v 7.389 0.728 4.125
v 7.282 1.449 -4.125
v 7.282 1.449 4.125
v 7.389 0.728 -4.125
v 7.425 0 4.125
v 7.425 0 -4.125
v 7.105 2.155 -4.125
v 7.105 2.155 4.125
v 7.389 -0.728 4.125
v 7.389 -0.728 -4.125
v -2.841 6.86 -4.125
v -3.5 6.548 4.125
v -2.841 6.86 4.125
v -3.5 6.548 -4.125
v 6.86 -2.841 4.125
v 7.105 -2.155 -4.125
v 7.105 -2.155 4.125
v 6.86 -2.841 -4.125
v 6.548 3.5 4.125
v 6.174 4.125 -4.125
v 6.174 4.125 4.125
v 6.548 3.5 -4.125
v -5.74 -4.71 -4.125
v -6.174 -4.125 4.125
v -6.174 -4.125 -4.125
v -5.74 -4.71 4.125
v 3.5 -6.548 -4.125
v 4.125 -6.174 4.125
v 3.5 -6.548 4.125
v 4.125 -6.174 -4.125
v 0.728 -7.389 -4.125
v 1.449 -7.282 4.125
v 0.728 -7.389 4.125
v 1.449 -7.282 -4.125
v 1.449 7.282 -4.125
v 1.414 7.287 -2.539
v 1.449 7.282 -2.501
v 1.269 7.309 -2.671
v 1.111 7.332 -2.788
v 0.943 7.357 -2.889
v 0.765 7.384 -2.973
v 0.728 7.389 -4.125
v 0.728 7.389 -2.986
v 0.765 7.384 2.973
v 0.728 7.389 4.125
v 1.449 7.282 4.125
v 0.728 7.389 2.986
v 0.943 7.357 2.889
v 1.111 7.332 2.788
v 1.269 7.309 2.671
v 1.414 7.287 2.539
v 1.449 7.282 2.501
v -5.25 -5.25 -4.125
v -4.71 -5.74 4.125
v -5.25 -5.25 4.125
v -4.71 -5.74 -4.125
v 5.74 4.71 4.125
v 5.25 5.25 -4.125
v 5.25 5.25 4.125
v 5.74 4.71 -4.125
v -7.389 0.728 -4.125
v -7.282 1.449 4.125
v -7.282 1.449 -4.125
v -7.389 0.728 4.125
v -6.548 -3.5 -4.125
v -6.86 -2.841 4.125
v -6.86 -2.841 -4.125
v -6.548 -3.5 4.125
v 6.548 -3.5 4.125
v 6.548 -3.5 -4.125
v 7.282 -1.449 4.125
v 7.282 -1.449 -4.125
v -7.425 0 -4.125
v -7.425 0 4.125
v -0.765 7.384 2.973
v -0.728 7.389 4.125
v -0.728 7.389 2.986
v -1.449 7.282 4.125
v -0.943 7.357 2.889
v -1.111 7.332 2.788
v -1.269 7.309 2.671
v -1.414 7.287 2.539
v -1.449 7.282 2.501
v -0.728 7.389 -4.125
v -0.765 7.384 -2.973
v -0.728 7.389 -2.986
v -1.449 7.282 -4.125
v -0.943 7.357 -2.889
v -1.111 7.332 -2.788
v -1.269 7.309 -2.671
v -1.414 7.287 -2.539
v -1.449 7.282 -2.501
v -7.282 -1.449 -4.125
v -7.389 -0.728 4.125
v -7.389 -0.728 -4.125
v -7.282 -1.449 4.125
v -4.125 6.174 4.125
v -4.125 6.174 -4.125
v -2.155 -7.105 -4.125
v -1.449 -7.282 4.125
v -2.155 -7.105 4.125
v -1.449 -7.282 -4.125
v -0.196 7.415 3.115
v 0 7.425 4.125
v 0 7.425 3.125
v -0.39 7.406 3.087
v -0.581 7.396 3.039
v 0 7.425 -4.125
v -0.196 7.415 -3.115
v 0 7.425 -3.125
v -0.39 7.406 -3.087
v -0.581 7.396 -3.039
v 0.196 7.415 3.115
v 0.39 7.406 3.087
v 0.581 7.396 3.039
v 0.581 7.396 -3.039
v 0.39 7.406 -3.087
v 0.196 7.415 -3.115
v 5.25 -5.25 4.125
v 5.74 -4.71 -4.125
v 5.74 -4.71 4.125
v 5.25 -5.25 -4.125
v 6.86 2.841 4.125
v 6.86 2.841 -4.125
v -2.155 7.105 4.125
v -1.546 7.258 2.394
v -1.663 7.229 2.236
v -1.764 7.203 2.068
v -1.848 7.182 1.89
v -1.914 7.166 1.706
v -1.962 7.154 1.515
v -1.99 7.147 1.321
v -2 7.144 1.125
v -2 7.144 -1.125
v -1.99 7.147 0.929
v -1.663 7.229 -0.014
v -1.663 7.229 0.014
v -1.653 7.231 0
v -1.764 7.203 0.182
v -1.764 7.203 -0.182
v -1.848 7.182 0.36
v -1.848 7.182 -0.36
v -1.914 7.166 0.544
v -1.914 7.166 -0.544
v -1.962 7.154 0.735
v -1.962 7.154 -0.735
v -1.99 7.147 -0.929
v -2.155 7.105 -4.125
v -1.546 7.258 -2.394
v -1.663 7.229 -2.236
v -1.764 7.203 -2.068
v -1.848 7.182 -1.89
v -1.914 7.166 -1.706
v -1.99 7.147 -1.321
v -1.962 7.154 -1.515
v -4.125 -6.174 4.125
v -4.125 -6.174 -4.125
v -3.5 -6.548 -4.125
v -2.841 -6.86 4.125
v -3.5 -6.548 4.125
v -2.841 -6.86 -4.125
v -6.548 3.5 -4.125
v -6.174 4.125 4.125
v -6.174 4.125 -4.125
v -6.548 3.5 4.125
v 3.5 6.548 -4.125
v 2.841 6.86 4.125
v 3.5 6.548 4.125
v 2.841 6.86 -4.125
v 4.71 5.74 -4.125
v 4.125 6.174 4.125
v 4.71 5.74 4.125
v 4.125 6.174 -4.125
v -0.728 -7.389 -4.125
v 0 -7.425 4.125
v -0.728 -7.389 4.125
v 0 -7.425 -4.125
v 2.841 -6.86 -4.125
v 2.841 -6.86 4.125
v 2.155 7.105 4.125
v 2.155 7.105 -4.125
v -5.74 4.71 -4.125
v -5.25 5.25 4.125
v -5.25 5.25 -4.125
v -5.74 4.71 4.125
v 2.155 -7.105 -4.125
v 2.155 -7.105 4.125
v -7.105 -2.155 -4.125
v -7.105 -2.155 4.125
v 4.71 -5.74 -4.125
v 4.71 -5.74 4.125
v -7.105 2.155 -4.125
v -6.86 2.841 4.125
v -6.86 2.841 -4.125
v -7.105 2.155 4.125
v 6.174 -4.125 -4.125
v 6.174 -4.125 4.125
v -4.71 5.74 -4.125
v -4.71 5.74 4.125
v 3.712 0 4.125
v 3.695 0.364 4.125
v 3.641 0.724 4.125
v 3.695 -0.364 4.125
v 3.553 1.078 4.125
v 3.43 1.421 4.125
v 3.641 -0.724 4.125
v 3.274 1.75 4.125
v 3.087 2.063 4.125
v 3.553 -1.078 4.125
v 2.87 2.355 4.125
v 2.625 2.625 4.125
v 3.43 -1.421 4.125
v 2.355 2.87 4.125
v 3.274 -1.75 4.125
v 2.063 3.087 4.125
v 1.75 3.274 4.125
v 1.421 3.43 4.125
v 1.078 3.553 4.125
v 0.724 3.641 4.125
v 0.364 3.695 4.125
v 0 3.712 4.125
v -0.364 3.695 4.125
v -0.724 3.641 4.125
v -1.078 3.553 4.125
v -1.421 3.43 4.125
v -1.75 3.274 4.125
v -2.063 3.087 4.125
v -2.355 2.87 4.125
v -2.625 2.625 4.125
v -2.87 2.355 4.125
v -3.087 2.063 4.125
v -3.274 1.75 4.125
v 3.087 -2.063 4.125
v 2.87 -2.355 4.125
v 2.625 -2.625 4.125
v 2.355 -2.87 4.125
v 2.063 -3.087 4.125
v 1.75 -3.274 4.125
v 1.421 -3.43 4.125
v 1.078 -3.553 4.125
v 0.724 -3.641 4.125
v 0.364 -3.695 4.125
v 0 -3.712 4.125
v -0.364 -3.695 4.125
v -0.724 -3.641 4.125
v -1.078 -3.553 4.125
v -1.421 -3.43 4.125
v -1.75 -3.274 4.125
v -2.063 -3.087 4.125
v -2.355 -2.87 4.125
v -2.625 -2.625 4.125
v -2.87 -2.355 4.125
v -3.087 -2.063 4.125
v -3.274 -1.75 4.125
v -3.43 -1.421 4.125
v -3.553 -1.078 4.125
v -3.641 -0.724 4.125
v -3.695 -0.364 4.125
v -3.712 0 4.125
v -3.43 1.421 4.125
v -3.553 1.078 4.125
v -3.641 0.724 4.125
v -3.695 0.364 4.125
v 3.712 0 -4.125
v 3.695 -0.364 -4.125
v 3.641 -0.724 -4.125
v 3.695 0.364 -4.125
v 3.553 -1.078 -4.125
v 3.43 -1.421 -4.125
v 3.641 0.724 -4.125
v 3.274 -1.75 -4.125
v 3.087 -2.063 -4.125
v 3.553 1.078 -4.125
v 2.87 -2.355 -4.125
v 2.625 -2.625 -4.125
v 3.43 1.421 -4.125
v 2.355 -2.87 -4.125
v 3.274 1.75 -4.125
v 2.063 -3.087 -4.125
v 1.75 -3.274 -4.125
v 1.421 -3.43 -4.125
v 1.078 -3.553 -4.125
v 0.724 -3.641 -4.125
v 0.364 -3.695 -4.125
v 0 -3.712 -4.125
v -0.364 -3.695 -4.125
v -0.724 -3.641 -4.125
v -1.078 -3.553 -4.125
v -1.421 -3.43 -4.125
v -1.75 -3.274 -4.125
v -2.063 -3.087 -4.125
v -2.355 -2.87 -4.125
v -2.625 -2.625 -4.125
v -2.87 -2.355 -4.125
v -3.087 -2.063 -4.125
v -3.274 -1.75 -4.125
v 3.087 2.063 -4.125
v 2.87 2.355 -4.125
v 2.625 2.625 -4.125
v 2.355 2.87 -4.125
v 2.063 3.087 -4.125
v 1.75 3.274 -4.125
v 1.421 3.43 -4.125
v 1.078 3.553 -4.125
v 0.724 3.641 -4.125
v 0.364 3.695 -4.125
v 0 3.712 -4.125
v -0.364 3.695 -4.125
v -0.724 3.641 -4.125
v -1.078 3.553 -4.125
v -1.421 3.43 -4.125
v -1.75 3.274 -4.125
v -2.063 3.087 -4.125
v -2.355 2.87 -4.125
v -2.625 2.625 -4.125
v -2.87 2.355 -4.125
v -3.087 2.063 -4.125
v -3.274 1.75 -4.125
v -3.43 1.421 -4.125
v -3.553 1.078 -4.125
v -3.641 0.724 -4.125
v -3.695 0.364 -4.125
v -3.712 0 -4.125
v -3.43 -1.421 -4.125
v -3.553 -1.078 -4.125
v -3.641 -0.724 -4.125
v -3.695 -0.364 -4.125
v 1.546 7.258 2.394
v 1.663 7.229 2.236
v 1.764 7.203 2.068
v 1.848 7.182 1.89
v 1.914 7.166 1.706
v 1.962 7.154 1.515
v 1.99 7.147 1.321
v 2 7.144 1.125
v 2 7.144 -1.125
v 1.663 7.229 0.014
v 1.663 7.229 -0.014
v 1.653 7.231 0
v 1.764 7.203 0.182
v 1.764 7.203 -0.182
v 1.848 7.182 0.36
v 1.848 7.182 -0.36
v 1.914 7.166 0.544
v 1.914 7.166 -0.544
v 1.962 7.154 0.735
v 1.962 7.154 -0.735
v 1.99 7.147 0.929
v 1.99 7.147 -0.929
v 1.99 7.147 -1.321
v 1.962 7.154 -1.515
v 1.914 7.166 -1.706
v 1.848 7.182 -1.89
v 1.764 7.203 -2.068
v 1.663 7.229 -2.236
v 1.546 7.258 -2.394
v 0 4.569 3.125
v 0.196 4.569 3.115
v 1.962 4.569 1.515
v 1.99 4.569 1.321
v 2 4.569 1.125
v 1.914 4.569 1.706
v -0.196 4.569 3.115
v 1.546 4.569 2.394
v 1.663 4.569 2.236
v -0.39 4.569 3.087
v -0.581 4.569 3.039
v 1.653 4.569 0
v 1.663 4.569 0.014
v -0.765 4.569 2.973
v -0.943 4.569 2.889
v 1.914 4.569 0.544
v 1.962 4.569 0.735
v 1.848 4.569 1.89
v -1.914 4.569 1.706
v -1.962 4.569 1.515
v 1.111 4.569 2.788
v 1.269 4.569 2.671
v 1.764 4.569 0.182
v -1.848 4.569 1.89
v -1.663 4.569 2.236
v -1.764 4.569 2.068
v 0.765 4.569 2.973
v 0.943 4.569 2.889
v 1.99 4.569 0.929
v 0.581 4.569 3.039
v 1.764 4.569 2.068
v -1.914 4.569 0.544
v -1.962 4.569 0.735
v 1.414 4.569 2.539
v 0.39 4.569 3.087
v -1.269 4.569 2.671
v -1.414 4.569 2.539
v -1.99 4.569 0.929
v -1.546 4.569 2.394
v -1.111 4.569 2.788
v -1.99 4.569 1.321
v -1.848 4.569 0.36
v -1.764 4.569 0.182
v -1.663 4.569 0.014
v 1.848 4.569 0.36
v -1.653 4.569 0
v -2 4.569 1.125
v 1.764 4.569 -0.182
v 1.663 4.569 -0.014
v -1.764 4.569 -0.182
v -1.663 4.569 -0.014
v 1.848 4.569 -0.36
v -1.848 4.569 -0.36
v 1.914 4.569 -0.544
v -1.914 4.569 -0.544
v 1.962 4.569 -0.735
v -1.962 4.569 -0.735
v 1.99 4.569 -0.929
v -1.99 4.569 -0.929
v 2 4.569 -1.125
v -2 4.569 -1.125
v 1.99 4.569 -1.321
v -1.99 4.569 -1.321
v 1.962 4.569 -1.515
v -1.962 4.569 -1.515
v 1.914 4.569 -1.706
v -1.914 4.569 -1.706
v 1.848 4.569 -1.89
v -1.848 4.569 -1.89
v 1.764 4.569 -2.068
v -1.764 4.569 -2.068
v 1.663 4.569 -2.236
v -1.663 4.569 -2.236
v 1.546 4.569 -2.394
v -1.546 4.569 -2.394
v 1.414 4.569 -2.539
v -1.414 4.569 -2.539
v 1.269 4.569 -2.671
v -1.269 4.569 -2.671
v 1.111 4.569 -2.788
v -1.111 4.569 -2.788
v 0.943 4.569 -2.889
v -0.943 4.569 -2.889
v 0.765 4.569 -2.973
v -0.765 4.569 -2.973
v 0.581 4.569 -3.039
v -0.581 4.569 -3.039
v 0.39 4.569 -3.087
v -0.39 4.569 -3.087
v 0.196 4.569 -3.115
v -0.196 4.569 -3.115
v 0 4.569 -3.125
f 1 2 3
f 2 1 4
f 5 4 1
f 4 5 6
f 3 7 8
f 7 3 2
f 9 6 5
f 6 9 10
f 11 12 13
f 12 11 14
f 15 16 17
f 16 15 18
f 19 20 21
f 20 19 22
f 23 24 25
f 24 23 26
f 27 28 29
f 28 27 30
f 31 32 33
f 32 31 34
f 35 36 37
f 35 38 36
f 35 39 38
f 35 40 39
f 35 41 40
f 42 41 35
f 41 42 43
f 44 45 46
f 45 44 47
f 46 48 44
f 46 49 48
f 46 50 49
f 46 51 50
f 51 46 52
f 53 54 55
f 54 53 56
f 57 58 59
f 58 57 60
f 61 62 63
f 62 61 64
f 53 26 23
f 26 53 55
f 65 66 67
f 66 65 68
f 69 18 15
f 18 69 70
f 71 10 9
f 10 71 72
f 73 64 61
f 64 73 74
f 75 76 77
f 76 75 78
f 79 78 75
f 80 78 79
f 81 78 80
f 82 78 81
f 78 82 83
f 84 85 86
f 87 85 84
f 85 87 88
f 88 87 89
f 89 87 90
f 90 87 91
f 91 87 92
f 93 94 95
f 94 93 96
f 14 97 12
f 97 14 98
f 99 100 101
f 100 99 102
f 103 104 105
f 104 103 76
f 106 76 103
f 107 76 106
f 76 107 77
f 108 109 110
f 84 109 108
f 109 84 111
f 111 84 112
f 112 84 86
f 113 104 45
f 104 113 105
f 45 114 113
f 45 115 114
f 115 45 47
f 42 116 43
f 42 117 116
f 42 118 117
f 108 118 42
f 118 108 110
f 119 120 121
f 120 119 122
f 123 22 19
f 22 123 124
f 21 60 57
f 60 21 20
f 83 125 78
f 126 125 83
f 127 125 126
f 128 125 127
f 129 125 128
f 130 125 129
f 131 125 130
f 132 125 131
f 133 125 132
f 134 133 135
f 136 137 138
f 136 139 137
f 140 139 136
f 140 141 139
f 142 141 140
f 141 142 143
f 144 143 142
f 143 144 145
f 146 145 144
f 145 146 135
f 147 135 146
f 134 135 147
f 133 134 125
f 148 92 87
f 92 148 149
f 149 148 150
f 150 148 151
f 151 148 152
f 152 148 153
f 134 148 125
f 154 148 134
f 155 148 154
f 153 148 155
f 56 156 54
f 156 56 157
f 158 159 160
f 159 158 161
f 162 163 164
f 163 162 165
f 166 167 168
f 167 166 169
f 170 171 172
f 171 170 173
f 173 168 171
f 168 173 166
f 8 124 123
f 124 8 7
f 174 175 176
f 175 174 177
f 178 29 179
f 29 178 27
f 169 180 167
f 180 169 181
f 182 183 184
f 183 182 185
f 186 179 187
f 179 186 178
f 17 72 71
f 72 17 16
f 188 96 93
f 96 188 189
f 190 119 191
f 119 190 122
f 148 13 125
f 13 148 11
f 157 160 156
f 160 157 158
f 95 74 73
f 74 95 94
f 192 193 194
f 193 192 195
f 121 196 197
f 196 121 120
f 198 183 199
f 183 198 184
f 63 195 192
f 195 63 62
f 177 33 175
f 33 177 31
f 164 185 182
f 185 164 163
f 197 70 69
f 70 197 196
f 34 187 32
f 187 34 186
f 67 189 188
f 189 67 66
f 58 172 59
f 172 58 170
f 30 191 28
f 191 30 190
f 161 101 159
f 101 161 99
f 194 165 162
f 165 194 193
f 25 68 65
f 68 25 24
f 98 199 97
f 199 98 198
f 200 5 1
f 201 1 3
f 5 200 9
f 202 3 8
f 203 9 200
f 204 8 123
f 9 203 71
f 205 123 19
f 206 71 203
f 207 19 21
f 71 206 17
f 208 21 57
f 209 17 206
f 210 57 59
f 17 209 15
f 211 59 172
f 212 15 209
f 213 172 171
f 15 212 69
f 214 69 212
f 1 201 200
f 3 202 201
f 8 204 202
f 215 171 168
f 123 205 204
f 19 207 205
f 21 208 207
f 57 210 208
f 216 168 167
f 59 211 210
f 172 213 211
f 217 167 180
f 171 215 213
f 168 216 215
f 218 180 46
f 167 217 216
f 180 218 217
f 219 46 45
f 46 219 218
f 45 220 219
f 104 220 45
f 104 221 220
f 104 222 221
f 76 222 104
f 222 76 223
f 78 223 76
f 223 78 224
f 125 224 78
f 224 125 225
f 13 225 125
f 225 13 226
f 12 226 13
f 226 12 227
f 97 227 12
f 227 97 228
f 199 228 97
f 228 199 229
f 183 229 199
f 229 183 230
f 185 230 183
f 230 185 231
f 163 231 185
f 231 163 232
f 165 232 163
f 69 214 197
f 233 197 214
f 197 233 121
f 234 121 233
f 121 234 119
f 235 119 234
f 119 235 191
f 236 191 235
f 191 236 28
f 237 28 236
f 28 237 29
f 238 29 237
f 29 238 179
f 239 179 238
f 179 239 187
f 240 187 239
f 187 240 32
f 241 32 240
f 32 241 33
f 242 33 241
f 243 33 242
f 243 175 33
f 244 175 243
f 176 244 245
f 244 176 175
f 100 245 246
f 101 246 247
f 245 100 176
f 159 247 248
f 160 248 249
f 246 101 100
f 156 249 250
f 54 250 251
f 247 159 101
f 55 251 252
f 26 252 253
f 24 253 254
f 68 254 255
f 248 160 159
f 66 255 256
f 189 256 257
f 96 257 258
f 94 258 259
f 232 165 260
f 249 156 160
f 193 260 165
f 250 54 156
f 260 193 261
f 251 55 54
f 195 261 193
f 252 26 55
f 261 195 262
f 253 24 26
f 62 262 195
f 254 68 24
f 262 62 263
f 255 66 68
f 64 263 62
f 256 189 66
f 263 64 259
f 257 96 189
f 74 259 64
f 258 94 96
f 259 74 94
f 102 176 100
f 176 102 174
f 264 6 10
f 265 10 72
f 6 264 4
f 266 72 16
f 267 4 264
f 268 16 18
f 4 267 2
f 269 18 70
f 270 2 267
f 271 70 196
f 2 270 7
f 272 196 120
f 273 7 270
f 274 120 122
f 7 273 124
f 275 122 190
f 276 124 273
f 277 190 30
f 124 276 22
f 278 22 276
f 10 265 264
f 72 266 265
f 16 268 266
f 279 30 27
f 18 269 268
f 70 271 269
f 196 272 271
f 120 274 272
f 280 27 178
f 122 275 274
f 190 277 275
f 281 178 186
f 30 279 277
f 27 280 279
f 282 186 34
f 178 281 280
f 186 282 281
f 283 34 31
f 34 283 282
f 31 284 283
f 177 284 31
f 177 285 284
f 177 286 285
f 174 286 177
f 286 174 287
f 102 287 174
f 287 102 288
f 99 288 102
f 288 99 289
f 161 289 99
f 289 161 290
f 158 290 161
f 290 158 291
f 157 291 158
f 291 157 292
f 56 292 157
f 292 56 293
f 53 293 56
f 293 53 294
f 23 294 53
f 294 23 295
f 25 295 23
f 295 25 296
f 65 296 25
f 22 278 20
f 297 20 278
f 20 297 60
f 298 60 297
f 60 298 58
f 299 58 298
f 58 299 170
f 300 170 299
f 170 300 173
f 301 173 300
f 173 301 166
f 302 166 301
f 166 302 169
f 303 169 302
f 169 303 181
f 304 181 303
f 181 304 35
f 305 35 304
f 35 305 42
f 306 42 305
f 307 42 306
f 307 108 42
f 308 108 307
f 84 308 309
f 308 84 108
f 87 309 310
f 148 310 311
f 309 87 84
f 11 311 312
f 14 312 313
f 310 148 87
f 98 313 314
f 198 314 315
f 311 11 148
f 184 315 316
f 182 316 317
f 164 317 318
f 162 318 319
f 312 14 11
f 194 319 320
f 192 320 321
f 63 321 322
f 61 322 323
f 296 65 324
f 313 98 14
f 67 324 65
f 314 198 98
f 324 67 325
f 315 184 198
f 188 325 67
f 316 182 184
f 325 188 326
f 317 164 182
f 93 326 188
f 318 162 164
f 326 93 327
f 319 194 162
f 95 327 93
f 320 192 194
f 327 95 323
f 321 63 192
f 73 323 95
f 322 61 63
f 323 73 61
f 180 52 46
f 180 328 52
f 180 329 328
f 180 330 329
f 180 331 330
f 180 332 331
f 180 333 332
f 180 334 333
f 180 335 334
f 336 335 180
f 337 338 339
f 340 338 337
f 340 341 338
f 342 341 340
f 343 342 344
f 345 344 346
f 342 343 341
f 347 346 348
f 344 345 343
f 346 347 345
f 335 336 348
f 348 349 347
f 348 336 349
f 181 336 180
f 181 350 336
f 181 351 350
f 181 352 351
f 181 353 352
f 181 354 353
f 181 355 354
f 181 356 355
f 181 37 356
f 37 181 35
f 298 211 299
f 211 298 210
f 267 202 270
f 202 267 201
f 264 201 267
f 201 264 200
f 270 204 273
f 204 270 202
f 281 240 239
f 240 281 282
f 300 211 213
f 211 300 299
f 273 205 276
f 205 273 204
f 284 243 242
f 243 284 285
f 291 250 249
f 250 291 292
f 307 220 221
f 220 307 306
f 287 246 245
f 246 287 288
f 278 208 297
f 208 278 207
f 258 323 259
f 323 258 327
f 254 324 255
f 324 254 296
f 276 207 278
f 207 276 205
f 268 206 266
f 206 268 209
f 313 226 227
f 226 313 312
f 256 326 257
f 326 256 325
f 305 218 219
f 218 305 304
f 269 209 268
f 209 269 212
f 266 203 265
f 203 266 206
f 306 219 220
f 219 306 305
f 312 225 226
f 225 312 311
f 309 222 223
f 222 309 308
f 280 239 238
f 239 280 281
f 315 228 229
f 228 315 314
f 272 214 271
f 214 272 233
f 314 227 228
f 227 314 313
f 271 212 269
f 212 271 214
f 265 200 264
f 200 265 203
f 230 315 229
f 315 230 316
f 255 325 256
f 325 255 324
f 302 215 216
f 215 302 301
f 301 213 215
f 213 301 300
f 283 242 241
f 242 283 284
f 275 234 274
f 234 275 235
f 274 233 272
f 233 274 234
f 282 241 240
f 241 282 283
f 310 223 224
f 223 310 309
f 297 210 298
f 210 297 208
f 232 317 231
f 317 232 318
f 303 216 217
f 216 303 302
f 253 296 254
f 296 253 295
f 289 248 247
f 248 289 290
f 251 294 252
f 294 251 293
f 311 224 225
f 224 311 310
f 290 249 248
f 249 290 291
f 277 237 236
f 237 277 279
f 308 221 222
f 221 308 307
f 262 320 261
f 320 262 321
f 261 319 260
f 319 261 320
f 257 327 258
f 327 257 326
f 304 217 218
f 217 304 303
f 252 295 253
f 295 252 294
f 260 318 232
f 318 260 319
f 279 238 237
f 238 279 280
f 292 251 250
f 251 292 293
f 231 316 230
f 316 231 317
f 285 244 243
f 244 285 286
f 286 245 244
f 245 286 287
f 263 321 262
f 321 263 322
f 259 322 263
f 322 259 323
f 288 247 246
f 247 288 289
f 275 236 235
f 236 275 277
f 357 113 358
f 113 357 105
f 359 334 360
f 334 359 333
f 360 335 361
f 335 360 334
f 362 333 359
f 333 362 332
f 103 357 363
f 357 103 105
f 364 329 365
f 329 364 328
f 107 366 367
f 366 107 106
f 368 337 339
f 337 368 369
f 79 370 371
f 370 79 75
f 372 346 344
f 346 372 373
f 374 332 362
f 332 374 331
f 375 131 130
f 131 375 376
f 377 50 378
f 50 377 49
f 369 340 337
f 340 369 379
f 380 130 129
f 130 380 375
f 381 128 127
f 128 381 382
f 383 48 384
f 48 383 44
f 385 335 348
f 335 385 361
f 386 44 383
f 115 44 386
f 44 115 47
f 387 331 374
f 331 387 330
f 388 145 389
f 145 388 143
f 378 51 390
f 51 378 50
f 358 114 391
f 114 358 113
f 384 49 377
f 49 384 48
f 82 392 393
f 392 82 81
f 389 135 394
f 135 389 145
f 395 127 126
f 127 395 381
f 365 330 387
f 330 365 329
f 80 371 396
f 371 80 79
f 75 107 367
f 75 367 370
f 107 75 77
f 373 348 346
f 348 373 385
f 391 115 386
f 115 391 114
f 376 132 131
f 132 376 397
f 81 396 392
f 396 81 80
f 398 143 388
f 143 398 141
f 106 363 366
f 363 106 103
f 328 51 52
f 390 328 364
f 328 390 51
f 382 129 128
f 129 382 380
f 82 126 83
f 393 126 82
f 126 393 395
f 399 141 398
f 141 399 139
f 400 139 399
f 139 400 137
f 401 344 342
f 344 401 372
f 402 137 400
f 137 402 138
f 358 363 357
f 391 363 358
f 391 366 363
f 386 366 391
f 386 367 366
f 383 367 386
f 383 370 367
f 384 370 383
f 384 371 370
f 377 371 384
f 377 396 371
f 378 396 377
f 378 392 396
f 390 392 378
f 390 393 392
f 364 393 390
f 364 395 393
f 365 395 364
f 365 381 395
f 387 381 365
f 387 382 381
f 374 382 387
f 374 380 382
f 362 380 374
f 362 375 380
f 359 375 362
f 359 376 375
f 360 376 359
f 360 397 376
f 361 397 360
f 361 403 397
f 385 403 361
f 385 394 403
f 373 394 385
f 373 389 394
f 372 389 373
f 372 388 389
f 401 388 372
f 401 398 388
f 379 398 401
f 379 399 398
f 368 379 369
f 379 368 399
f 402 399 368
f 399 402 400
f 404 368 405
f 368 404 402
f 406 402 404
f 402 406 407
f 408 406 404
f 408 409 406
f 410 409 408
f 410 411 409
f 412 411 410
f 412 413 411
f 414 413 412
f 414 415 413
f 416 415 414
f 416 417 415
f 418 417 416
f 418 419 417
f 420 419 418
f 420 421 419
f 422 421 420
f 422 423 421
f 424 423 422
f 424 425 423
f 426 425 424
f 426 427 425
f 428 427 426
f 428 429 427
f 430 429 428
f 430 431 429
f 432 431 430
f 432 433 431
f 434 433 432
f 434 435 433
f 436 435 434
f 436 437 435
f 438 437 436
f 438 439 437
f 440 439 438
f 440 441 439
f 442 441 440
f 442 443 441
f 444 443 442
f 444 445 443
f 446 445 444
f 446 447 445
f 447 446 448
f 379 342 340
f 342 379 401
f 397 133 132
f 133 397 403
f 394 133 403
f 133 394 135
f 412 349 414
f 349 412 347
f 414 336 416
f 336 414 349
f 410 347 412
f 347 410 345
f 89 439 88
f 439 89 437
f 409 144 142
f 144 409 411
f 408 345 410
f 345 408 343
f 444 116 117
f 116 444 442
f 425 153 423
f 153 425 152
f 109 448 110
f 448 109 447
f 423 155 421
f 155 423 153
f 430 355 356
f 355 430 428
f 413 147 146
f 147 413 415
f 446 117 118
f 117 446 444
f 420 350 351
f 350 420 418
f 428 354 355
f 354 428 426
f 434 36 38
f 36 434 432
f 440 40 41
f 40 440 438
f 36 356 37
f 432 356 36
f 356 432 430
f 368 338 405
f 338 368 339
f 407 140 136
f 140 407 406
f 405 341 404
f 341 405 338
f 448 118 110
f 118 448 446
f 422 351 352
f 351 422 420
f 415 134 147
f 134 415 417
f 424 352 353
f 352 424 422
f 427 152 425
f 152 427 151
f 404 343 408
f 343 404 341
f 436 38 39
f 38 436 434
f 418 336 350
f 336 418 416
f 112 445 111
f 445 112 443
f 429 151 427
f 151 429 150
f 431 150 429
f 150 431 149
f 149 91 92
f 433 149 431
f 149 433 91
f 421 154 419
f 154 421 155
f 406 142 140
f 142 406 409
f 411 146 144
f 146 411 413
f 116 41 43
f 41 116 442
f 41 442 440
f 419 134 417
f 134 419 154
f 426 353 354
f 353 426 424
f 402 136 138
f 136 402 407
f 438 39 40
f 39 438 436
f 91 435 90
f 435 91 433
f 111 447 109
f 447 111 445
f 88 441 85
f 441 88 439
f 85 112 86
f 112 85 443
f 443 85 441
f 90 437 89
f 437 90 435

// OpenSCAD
// COBRA Vertebra - L5 V23
// Height: 8.25mm, OD: 14.850000000000001mm

$fn = 64;

difference() {
    // Outer cylinder
    cylinder(h=8.25, d=14.850000000000001, center=true);
    
    // Inner channel
    cylinder(h=10.25, d=7.425000000000001, center=true);

    // Pivot holes
    translate([0, 7.425000000000001, 1.125])
    rotate([90, 0, 0])
    cylinder(h=5.7125, d=4, center=true);
    
    translate([0, 7.425000000000001, -1.125])
    rotate([90, 0, 0])
    cylinder(h=5.7125, d=4, center=true);
}
